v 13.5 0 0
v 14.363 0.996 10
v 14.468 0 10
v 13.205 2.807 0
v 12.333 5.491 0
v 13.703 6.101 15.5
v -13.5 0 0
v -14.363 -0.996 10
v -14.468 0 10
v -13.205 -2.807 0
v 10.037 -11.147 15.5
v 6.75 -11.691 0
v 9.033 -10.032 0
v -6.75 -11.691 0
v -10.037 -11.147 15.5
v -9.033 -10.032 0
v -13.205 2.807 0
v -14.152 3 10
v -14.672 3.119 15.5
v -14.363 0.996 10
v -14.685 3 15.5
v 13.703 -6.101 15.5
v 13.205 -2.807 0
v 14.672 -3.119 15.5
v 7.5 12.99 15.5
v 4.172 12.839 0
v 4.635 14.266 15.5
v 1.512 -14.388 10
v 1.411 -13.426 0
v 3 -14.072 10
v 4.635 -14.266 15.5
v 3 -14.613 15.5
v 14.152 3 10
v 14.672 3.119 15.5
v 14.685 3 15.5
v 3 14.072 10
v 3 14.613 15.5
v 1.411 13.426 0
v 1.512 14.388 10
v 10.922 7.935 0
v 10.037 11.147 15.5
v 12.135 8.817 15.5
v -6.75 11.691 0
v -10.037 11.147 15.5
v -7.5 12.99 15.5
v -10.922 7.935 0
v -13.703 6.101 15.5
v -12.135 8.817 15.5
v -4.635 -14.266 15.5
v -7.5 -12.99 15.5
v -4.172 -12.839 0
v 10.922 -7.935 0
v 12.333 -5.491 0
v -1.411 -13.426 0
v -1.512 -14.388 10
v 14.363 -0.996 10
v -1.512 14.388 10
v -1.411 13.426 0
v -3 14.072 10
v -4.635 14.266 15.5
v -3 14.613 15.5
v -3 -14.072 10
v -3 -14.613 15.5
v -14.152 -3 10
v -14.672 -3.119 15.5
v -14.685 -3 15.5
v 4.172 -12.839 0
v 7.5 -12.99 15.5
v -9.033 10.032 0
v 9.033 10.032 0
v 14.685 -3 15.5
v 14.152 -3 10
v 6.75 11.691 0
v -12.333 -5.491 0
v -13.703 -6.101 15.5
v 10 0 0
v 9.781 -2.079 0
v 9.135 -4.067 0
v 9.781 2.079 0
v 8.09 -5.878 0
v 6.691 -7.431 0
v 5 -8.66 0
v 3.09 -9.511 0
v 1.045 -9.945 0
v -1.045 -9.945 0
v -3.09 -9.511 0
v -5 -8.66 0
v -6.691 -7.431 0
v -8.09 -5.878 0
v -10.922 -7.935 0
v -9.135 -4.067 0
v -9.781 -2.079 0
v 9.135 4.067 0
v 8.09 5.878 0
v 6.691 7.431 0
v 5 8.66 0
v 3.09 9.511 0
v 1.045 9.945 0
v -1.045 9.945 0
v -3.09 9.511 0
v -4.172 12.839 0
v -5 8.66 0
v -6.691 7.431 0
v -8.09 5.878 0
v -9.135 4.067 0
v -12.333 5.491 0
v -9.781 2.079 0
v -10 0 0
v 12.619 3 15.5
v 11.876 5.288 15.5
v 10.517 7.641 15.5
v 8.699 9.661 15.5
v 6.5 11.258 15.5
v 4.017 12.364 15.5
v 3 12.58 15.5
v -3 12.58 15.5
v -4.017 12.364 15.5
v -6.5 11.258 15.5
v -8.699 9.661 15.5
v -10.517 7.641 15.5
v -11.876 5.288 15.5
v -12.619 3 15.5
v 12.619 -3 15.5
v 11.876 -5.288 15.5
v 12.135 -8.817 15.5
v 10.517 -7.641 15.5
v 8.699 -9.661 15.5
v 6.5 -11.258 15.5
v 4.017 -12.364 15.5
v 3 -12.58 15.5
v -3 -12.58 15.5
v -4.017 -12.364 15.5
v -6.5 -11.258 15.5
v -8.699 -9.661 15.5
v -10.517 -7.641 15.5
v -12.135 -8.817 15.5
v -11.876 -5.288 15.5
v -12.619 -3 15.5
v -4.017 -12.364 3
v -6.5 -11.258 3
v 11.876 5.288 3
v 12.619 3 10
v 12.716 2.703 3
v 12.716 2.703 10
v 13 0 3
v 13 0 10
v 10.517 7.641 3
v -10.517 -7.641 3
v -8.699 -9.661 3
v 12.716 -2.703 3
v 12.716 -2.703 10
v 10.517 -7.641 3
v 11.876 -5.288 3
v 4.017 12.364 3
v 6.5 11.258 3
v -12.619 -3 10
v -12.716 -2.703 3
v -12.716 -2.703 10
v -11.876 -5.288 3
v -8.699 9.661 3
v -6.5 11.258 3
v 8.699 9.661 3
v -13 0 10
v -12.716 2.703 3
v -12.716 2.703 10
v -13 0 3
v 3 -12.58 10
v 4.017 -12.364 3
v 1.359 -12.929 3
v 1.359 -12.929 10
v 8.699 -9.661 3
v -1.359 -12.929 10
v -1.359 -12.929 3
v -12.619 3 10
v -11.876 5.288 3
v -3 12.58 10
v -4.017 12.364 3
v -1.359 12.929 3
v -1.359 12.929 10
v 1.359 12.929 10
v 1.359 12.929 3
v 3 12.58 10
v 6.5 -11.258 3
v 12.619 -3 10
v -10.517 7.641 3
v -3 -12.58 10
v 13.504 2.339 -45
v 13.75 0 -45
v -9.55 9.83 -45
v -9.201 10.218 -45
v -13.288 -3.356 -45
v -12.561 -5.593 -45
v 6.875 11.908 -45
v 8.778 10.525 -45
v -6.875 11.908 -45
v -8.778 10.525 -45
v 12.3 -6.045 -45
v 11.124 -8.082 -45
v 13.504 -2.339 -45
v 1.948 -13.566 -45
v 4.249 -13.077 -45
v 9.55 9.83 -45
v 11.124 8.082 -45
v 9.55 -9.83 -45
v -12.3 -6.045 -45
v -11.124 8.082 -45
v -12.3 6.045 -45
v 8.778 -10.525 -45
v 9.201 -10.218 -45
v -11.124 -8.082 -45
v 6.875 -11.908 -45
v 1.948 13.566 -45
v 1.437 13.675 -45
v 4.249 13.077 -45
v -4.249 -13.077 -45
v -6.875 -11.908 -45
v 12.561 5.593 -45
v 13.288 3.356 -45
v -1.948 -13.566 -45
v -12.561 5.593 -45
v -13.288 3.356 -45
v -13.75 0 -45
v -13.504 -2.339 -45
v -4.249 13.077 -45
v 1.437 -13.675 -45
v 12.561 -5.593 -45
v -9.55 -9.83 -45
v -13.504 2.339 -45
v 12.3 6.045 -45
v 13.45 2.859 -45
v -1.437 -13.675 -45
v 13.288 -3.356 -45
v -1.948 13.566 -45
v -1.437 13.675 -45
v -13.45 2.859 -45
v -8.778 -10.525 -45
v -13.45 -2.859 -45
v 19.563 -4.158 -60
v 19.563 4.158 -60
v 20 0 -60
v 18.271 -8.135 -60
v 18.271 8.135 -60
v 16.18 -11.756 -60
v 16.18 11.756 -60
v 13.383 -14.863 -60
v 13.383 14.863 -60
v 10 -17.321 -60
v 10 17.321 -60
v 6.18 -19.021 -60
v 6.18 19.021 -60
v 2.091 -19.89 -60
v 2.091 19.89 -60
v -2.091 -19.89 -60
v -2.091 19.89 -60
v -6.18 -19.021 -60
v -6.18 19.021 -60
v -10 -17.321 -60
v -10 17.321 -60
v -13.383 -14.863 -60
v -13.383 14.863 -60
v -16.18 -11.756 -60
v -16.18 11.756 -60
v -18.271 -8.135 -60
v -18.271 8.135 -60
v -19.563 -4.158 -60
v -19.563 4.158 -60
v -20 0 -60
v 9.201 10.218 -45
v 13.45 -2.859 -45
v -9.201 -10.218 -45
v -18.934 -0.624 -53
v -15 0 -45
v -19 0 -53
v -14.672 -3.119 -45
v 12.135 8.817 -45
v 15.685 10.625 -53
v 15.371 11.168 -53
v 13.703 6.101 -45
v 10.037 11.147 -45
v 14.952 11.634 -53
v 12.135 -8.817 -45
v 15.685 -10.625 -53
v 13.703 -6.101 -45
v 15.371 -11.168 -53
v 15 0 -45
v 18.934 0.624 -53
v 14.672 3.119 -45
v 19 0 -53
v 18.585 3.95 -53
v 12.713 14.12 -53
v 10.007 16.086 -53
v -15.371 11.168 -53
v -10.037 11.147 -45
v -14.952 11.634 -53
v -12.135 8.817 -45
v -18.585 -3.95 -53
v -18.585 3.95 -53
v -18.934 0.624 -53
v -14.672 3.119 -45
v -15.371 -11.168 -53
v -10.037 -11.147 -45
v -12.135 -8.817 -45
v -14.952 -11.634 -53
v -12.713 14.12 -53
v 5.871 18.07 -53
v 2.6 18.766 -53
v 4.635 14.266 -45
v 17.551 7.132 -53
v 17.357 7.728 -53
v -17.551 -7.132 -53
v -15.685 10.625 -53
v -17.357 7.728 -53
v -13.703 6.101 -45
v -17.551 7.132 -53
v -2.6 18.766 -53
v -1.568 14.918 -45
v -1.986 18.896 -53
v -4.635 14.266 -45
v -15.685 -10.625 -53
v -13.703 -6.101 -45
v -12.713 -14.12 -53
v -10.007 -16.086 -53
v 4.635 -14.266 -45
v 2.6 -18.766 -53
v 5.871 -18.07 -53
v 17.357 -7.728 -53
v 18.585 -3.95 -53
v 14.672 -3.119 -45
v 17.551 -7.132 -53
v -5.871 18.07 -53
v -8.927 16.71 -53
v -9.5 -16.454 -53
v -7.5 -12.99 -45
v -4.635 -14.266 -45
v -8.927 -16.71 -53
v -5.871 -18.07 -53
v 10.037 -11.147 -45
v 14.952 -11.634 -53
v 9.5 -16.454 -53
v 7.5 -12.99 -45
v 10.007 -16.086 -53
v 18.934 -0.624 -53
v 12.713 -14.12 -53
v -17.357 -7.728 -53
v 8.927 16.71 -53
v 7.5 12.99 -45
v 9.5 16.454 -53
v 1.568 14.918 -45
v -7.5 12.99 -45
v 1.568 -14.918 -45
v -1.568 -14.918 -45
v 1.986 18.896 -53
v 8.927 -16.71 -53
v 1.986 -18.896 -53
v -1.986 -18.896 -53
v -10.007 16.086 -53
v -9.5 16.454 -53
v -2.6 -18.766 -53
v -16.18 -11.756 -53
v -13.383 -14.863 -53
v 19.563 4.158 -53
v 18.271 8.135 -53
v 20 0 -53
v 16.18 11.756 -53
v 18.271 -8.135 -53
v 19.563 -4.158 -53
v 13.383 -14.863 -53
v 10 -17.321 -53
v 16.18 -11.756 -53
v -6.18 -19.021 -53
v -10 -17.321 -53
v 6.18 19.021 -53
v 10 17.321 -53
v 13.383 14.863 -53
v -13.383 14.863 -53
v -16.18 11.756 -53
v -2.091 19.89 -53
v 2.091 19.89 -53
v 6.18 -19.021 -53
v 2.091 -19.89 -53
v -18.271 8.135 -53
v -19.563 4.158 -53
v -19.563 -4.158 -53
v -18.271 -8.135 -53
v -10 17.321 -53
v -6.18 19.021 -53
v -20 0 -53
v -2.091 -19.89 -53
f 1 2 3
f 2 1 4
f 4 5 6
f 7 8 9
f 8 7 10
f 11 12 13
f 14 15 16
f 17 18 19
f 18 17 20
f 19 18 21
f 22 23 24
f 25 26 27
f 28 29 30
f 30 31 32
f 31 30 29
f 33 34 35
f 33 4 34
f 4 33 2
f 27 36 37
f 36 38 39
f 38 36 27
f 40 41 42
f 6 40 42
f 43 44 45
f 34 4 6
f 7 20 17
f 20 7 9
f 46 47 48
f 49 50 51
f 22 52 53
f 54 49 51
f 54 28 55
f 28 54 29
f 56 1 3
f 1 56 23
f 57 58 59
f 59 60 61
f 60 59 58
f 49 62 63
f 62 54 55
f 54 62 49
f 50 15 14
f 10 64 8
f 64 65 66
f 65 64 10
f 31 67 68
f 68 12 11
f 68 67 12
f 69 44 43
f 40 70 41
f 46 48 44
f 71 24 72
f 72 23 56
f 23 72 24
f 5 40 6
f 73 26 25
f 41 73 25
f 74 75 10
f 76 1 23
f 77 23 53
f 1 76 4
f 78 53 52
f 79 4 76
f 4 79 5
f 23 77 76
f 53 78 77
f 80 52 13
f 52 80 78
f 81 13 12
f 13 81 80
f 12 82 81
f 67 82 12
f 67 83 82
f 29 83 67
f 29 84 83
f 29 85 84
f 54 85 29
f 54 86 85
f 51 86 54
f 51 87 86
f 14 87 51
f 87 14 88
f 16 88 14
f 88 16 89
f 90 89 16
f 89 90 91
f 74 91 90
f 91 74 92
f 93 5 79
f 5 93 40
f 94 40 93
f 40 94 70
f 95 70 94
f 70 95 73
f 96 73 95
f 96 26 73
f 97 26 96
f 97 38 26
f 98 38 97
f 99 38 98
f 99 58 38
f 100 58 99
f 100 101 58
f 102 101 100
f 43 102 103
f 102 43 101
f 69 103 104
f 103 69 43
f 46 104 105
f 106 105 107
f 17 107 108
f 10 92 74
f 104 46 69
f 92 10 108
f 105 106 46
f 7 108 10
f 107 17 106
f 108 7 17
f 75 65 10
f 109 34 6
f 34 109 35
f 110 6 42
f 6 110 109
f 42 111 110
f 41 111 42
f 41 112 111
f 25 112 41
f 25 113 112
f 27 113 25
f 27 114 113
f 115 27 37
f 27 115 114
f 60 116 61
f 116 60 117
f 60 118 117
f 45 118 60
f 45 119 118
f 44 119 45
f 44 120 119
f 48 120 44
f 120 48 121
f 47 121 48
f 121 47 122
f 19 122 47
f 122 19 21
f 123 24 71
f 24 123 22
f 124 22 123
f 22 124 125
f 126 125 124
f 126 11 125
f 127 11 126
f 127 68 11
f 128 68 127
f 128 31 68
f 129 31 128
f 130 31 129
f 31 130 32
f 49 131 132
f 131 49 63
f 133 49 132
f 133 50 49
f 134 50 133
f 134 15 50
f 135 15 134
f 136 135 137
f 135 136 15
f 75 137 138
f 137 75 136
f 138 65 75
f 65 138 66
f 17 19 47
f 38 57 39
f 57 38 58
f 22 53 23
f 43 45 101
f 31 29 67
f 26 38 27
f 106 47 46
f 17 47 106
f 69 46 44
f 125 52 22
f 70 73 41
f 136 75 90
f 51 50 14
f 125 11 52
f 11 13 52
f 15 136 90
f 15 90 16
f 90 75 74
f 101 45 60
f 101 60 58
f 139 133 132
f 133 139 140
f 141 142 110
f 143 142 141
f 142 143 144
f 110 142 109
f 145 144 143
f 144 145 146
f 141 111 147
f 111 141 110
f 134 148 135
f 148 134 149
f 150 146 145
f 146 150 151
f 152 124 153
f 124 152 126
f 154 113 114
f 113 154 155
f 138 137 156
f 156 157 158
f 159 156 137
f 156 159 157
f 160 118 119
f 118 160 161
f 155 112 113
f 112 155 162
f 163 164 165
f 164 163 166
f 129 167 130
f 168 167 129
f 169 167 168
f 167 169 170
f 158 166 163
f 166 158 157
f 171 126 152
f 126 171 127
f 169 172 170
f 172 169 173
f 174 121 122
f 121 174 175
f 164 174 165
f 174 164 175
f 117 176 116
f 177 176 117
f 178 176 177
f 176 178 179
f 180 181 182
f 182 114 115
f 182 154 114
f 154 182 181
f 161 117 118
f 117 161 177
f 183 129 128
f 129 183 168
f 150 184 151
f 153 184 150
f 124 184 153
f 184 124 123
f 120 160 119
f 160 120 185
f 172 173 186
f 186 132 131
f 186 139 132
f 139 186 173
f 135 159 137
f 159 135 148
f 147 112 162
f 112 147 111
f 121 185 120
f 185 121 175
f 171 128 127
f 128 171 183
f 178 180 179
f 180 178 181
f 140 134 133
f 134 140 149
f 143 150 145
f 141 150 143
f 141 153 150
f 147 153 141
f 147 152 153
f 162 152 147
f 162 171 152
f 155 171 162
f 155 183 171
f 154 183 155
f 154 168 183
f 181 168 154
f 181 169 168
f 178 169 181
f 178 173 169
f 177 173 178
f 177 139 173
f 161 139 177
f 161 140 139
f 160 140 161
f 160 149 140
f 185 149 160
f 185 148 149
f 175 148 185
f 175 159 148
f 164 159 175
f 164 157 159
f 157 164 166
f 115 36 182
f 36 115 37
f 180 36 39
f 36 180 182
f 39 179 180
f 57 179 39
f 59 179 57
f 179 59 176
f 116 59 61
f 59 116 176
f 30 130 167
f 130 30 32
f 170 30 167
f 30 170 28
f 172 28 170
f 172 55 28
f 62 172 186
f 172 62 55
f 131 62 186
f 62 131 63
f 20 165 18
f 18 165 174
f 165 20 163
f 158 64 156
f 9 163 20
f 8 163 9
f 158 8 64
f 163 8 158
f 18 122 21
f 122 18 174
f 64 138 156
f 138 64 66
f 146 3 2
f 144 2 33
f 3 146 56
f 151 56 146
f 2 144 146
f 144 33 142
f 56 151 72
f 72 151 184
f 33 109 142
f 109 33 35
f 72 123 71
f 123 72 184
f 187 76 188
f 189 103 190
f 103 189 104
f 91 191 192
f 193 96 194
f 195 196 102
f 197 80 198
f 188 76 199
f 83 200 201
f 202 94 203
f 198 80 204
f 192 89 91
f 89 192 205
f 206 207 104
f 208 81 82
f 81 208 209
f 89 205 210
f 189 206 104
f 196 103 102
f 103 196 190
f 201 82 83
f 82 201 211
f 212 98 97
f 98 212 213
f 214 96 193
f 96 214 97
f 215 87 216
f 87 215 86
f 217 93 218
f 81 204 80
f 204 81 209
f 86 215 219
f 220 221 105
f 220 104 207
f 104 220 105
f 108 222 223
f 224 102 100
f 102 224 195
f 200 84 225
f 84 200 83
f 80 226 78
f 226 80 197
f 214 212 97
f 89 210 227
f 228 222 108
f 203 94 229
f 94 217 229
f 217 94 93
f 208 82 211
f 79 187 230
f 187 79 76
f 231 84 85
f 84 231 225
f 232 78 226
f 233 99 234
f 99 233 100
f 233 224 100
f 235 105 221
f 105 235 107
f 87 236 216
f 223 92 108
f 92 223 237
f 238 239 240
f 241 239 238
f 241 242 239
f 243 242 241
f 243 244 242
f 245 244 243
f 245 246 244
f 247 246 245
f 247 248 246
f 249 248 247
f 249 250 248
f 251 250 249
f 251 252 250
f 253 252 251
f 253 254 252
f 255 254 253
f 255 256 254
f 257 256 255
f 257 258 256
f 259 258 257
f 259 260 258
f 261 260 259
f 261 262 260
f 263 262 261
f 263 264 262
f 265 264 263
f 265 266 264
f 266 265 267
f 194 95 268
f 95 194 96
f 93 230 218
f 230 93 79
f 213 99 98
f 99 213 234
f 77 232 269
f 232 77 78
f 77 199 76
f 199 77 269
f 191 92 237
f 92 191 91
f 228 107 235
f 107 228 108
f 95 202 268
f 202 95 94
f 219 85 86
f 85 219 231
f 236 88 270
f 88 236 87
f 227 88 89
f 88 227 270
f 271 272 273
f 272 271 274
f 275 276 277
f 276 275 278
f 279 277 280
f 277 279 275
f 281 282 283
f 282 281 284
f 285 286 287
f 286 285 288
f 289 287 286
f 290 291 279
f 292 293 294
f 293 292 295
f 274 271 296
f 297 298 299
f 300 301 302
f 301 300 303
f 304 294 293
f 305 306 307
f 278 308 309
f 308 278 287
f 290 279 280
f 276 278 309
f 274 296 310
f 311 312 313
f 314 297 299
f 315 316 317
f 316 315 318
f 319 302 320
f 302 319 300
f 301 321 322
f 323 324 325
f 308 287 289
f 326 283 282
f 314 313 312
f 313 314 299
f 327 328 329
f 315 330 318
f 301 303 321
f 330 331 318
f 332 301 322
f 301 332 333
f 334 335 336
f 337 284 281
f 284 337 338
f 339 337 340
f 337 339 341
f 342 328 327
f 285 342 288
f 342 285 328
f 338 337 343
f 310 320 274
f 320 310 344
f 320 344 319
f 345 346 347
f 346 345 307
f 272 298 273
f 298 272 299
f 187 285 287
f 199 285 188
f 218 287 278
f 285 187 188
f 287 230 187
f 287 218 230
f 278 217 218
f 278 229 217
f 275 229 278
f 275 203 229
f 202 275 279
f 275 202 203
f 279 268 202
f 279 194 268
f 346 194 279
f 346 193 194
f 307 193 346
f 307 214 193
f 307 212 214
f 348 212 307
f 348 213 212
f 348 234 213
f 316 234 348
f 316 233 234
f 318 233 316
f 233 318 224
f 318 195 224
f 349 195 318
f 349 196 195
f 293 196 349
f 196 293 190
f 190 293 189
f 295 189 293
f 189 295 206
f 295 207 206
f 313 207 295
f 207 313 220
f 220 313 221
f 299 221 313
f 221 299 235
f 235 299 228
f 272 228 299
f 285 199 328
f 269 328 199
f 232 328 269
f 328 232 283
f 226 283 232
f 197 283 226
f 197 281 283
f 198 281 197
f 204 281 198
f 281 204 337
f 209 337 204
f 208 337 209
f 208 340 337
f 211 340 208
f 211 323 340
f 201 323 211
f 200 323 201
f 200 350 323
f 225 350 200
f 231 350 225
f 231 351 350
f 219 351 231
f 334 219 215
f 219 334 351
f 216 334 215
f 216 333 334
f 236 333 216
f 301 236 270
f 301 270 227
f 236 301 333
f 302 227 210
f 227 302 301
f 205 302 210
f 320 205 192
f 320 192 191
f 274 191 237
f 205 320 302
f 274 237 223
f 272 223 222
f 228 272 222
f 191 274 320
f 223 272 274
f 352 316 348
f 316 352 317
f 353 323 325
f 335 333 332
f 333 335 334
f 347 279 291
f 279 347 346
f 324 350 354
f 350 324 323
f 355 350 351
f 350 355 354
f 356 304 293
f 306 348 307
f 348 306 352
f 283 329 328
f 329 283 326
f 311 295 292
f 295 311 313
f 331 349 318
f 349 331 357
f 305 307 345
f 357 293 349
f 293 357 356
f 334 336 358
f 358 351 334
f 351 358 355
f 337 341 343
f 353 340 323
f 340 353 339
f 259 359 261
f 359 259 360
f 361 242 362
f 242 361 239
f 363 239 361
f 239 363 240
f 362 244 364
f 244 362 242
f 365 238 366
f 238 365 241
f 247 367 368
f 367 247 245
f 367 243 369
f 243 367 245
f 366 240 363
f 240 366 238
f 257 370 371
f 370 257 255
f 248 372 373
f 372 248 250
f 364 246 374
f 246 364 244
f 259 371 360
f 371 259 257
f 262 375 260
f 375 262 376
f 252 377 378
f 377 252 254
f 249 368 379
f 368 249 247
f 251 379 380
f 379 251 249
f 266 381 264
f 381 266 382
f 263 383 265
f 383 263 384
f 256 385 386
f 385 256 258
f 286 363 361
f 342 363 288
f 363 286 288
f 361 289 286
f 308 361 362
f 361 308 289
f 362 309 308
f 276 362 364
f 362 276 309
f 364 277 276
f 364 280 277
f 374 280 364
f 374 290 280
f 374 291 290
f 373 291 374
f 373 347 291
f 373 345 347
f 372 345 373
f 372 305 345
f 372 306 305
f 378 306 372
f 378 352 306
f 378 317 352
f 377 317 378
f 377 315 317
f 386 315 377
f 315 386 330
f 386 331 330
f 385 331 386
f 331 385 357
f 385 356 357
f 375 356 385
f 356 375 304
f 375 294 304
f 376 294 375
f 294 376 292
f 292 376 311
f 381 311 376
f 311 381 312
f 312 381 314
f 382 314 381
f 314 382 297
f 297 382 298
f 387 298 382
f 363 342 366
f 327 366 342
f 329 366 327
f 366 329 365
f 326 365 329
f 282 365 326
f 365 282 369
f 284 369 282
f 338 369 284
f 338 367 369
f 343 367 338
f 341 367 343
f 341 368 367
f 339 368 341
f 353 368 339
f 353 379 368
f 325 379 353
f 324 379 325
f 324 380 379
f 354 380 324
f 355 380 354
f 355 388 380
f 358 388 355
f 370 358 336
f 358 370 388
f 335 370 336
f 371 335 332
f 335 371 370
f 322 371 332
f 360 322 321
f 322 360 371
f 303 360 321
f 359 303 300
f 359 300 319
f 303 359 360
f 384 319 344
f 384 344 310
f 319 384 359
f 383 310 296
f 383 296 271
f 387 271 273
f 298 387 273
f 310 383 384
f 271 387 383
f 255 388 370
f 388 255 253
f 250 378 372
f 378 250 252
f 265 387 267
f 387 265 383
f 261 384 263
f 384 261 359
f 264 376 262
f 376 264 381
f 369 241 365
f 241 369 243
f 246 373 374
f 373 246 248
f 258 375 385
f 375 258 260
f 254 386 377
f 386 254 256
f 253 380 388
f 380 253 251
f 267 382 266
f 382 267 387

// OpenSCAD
union(){
    difference(){
    difference(){
        //head
    cylinder(15.5,13.5,15);
        translate([0,0,3])
        cylinder(13,13,13);
    }
    //nooks
    translate([-3,12,10])
    cube(6);
    translate([-3,-15,10])
    cube(6);
    translate([-15,-3,10])
    cube(6);
    translate([12,-3,10])
    cube(6);
}
//neck
translate([0,0,-60])
cylinder(60,15,10);
//base-cone
translate([0,0,-55])
cylinder(10,20,15);
//base-pedestal
translate([0,0,-60])
cylinder(7,20,20);
}
